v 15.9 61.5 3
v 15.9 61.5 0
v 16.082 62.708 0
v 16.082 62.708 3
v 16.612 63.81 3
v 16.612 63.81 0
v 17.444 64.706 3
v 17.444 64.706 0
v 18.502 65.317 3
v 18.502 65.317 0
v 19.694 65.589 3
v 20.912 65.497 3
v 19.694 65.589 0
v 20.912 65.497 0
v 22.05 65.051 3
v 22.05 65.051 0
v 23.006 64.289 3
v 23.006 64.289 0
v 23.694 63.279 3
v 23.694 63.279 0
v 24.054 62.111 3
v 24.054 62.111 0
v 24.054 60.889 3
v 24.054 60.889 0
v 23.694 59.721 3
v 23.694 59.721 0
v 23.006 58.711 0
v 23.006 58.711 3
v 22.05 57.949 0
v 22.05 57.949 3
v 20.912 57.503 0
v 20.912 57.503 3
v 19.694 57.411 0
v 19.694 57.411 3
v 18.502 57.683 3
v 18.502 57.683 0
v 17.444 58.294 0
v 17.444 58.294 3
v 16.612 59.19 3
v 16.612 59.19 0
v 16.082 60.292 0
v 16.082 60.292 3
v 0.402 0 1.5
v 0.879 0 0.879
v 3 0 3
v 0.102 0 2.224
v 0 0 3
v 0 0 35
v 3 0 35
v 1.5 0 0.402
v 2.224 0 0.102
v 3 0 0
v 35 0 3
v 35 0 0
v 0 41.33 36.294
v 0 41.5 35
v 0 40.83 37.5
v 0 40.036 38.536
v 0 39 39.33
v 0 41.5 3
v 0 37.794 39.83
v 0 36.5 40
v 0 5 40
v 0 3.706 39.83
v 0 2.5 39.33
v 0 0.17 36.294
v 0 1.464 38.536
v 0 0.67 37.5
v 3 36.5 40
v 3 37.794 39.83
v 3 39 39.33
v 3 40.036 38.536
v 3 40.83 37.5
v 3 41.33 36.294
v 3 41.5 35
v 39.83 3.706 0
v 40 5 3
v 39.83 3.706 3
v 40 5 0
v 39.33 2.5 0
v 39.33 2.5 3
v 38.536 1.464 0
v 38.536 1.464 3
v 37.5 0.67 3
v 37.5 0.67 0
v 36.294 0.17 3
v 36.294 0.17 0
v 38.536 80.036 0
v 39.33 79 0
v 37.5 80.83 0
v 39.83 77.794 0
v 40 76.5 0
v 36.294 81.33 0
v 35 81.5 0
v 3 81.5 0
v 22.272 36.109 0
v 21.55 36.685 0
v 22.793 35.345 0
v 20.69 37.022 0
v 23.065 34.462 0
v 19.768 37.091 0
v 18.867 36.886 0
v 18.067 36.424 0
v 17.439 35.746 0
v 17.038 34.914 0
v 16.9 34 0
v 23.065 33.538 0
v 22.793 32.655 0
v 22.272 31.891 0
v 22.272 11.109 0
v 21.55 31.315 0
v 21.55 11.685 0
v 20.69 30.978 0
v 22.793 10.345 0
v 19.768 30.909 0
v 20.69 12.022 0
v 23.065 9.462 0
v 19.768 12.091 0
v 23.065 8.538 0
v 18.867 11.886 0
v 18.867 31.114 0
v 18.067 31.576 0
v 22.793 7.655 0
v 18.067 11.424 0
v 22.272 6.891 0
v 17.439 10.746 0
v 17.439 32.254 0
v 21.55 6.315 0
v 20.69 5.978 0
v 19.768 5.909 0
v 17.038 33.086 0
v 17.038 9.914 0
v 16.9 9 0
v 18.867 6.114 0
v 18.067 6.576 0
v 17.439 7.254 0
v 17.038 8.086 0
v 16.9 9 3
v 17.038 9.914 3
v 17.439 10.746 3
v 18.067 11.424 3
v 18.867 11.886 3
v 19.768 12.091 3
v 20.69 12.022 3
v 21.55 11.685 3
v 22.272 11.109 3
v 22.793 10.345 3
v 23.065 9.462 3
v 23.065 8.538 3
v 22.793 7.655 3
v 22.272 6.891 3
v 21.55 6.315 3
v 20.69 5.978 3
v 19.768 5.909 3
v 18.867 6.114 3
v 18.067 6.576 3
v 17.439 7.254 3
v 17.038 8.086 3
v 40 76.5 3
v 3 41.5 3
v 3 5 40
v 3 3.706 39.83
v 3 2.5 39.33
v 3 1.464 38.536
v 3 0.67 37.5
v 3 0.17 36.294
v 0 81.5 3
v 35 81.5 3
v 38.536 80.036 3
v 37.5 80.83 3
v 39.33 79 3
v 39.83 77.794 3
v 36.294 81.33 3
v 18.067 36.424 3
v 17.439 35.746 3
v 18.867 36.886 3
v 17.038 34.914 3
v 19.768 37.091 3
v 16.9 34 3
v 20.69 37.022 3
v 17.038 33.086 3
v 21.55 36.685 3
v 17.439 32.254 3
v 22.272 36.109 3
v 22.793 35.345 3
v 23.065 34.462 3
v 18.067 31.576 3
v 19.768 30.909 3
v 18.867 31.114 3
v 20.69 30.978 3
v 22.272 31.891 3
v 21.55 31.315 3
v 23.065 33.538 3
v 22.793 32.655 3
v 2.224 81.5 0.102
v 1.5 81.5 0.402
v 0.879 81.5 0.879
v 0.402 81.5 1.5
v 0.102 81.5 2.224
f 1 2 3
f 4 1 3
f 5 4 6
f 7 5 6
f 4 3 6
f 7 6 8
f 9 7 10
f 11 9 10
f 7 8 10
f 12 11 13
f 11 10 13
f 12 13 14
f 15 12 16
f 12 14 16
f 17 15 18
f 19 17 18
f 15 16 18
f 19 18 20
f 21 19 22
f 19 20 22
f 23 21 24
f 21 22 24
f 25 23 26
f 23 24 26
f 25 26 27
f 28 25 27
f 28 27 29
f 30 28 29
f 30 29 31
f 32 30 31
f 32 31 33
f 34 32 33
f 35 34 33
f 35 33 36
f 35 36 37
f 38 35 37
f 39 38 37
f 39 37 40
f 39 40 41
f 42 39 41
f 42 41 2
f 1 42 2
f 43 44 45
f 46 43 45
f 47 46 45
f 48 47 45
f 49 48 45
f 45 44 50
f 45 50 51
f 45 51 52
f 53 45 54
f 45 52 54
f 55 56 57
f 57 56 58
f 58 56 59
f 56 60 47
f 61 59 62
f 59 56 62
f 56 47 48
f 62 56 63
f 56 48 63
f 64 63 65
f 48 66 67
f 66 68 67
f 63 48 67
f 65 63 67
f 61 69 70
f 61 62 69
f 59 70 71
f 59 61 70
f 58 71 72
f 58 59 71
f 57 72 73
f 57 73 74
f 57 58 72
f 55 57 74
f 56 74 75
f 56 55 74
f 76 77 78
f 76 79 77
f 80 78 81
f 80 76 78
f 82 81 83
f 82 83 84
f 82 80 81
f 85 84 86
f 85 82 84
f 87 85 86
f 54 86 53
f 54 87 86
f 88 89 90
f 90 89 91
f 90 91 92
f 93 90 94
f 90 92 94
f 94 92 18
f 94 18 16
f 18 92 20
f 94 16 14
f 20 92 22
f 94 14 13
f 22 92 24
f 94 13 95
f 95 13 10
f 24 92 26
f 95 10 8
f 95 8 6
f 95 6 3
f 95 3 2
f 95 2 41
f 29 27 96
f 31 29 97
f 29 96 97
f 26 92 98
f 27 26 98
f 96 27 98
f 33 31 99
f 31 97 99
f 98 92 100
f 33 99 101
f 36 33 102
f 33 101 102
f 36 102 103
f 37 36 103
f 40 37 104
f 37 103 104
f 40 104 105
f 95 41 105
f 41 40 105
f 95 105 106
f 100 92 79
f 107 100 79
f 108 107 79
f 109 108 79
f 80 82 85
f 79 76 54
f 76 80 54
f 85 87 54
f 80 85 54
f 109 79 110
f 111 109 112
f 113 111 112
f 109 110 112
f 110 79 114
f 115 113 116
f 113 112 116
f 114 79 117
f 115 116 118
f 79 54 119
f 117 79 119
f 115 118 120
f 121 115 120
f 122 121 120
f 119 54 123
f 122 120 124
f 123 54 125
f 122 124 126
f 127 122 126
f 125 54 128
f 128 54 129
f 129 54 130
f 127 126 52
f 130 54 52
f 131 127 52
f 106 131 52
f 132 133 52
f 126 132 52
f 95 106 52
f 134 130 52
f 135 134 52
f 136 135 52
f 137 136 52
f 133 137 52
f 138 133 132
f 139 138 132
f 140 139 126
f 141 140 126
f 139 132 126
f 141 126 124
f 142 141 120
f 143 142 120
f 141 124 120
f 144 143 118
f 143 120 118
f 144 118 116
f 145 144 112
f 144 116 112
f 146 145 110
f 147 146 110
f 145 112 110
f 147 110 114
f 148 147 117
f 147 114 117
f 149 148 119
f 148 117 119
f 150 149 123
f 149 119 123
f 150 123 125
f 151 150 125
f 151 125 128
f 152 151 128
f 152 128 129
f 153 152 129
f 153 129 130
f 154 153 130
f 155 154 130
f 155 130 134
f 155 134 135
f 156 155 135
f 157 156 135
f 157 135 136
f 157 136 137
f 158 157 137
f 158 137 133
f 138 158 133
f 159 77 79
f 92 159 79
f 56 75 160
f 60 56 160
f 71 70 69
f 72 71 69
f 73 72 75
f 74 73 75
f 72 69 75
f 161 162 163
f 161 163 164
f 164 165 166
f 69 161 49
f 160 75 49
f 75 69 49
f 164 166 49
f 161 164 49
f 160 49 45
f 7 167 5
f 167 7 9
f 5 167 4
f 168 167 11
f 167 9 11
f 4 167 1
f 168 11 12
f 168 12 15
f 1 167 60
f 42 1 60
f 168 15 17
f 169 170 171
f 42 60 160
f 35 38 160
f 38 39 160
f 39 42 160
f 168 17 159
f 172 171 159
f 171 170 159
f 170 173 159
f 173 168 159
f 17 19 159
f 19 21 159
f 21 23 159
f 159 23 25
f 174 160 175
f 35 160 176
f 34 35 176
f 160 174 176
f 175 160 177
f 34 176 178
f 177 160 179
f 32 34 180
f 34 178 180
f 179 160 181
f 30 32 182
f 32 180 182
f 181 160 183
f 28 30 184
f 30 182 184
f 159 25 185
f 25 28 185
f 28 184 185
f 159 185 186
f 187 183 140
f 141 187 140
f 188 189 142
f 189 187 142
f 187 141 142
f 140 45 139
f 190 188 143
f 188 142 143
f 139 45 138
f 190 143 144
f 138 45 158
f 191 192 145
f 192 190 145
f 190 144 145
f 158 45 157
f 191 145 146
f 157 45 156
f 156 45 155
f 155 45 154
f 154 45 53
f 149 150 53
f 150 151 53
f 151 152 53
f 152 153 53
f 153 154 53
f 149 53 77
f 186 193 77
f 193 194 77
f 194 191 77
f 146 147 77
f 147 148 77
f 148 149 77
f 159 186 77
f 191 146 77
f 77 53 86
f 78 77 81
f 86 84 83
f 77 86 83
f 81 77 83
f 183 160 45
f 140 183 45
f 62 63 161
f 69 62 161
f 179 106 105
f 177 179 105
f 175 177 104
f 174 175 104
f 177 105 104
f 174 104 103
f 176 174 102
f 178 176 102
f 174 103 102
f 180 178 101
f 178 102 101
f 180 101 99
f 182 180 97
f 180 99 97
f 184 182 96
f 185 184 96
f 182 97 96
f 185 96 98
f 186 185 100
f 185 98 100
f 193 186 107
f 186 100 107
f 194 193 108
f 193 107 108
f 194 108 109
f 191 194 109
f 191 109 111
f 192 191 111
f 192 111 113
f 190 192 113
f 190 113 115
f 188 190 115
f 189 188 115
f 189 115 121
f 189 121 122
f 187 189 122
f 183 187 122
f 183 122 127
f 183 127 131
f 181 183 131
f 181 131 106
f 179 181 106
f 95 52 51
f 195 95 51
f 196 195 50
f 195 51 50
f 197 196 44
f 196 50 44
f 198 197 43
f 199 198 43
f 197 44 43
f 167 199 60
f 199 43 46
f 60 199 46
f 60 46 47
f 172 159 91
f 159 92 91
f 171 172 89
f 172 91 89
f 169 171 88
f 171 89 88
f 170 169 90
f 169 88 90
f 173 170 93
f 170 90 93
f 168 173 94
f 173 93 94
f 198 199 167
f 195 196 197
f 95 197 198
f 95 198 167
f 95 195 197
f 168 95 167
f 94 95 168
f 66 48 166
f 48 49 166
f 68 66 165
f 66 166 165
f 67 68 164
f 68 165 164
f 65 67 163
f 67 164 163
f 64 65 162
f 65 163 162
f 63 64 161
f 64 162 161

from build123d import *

# Parameters (mm, degrees)
EXTRUDE_THIN1_DEPTH = 81.5
SKETCH2_W           = 37
SKETCH2_H           = 40
CUT_EXTRUDE1_DEPTH  = 10
SKETCH3_R           = 4.1
CUT_EXTRUDE2_DEPTH  = 10
SKETCH4_R           = 3.1
CUT_EXTRUDE3_DEPTH  = 10
FILLET1_R           = 5


with BuildPart() as part:
    # Sketch1 → Extrude-Thin1 (new body)
    with BuildSketch(Plane(origin=(0, 0, 0), x_dir=(1, 0, 0), z_dir=(0, 1, 0))):
        with BuildLine():
            Line((40, 0), (3, 0))
            ThreePointArc((3, 0), (0.878679656, -0.878679656), (0, -3))
            Line((0, -3), (0, -40))
            Line((0, -40), (3, -40))
            Line((3, -40), (3, -3))
            Line((3, -3), (40, -3))
            Line((40, -3), (40, 0))
        make_face()
    extrude(amount=EXTRUDE_THIN1_DEPTH)

    # Sketch2 → Cut-Extrude1 (cut)
    with BuildSketch(Plane(origin=(3, 0, 0), x_dir=(0, 0, -1), z_dir=(1, 0, 0))):
        with Locations((-21.5, 61.5)):
            Rectangle(SKETCH2_W, SKETCH2_H)
    extrude(amount=-CUT_EXTRUDE1_DEPTH, mode=Mode.SUBTRACT)

    # Sketch3 → Cut-Extrude2 (cut)
    with BuildSketch(Plane(origin=(0, 0, 0), x_dir=(-1, 0, 0), z_dir=(0, 0, -1))):
        with Locations((-20, 61.5)):
            Circle(SKETCH3_R)
    extrude(amount=-CUT_EXTRUDE2_DEPTH, mode=Mode.SUBTRACT)

    # Sketch4 → Cut-Extrude3 (cut)
    with BuildSketch(Plane(origin=(0, 0, 0), x_dir=(-1, 0, 0), z_dir=(0, 0, -1))):
        with Locations((-20, 9)):
            Circle(SKETCH4_R)
        with Locations((-20, 34)):
            Circle(SKETCH4_R)
    extrude(amount=-CUT_EXTRUDE3_DEPTH, mode=Mode.SUBTRACT)

    # Fillet1
    fillet1_edges = [part.edges().sort_by_distance(p)[0] for p in [
        (1.5, 41.5, 40),
        (1.5, 0, 40),
        (40, 81.5, 1.5),
        (40, 0, 1.5),
    ]]
    fillet(fillet1_edges, radius=FILLET1_R)


solid = part.part
